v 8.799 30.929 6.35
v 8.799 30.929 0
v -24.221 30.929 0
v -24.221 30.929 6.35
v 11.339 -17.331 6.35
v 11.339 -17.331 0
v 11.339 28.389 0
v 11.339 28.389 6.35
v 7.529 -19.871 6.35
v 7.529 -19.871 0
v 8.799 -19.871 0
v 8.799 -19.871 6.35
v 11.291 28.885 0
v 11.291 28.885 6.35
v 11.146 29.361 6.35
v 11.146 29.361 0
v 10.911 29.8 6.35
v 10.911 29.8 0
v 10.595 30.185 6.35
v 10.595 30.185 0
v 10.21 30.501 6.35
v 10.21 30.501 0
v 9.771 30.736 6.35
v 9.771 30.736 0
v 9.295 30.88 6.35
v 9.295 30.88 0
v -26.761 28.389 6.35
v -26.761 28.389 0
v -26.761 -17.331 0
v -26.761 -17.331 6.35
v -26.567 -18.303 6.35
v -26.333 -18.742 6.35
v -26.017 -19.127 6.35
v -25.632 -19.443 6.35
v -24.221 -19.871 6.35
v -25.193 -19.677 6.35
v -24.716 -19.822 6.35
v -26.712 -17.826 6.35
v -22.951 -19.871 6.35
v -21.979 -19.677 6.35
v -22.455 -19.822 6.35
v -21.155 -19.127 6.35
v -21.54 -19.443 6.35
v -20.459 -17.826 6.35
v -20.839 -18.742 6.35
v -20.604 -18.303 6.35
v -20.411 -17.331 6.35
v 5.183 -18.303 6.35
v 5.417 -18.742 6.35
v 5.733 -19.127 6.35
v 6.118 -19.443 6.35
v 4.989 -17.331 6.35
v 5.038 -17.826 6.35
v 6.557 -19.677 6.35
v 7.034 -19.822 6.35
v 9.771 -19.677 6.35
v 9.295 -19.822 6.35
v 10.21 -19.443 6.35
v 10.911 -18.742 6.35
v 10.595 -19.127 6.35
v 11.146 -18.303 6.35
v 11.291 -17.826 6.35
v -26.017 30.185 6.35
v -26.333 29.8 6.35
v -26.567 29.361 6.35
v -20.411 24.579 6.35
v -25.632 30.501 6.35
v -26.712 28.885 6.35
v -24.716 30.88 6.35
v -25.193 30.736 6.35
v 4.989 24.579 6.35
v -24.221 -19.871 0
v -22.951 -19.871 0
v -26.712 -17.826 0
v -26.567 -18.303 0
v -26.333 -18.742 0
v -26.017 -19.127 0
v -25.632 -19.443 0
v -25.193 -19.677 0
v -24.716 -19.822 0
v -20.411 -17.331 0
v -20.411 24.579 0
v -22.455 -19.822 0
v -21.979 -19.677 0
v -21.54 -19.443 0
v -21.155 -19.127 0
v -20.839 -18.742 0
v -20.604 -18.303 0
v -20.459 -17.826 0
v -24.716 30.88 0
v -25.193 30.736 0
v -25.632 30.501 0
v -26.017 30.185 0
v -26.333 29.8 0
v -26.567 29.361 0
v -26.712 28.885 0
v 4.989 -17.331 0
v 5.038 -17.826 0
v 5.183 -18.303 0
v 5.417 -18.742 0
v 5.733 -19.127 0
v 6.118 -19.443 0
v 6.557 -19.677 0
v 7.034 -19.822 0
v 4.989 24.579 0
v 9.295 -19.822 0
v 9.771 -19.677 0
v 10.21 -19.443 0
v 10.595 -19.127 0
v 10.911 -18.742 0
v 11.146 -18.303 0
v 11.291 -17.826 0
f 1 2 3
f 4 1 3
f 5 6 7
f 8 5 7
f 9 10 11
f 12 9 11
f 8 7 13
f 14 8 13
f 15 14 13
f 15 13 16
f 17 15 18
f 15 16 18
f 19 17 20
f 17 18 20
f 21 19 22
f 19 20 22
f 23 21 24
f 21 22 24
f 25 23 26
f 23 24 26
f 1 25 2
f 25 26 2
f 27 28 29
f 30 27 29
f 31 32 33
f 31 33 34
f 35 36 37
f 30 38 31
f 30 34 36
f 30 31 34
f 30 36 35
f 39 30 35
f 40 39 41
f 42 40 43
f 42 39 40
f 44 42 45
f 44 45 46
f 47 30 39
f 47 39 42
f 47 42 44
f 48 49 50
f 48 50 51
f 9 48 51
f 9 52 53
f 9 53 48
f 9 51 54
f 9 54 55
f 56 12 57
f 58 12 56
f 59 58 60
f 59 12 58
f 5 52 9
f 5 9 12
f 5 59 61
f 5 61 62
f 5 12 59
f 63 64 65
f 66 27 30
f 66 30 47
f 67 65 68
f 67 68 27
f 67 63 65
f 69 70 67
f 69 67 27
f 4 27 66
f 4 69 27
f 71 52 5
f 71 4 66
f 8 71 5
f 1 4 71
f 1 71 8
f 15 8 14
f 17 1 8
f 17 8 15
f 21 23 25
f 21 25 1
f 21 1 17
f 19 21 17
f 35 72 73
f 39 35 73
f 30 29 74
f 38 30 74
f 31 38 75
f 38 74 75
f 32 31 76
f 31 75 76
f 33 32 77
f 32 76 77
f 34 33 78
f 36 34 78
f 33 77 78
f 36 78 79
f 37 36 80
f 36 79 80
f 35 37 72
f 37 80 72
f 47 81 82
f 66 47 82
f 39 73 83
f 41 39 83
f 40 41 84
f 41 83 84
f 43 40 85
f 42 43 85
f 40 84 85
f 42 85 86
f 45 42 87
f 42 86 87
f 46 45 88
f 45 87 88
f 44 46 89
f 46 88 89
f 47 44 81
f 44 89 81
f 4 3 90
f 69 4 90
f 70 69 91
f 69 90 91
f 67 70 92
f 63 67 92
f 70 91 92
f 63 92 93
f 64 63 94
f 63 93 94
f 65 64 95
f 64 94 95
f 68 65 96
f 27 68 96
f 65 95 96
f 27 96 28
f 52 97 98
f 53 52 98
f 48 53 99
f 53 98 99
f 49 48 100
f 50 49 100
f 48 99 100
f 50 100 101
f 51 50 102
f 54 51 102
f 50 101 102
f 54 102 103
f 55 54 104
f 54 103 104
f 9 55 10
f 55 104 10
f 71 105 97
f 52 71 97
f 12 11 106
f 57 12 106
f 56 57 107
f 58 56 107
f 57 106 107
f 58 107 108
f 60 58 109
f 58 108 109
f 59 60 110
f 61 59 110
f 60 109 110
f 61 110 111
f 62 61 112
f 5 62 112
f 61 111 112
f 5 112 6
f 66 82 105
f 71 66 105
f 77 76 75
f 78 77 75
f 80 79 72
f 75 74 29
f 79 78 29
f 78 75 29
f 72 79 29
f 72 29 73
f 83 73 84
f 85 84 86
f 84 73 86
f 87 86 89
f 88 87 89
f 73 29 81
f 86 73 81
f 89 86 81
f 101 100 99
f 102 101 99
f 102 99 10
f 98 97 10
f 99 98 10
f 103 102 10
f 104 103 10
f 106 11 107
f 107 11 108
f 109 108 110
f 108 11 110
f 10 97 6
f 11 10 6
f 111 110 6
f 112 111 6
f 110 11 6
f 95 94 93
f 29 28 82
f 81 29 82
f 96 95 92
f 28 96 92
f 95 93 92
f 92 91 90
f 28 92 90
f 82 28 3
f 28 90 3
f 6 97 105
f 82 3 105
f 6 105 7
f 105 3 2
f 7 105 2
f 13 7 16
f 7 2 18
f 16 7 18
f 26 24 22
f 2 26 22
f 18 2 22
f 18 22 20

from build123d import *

# Parameters (mm, degrees)
F1_DEPTH = 6.35


with BuildPart() as f1:
    # F0 (on Top) → F1 (new body)
    with BuildSketch(Plane.XY):
        with BuildLine():
            Line((-20.410651, -17.330817), (-20.410651, 24.579183))
            Line((-20.410651, 24.579183), (4.989349, 24.579183))
            Line((4.989349, 24.579183), (4.989349, -17.330817))
            ThreePointArc((4.989349, -17.330817), (5.733297, -19.126869), (7.529349, -19.870817))
            Line((7.529349, -19.870817), (8.799349, -19.870817))
            ThreePointArc((8.799349, -19.870817), (10.5954, -19.126869), (11.339349, -17.330817))
            Line((11.339349, -17.330817), (11.339349, 28.389183))
            ThreePointArc((11.339349, 28.389183), (10.5954, 30.185234), (8.799349, 30.929183))
            Line((8.799349, 30.929183), (-24.220651, 30.929183))
            ThreePointArc((-24.220651, 30.929183), (-26.016703, 30.185234), (-26.760651, 28.389183))
            Line((-26.760651, 28.389183), (-26.760651, -17.330817))
            ThreePointArc((-26.760651, -17.330817), (-26.016703, -19.126869), (-24.220651, -19.870817))
            Line((-24.220651, -19.870817), (-22.950651, -19.870817))
            ThreePointArc((-22.950651, -19.870817), (-21.1546, -19.126869), (-20.410651, -17.330817))
        make_face()
    extrude(amount=F1_DEPTH)


solid = f1.part
